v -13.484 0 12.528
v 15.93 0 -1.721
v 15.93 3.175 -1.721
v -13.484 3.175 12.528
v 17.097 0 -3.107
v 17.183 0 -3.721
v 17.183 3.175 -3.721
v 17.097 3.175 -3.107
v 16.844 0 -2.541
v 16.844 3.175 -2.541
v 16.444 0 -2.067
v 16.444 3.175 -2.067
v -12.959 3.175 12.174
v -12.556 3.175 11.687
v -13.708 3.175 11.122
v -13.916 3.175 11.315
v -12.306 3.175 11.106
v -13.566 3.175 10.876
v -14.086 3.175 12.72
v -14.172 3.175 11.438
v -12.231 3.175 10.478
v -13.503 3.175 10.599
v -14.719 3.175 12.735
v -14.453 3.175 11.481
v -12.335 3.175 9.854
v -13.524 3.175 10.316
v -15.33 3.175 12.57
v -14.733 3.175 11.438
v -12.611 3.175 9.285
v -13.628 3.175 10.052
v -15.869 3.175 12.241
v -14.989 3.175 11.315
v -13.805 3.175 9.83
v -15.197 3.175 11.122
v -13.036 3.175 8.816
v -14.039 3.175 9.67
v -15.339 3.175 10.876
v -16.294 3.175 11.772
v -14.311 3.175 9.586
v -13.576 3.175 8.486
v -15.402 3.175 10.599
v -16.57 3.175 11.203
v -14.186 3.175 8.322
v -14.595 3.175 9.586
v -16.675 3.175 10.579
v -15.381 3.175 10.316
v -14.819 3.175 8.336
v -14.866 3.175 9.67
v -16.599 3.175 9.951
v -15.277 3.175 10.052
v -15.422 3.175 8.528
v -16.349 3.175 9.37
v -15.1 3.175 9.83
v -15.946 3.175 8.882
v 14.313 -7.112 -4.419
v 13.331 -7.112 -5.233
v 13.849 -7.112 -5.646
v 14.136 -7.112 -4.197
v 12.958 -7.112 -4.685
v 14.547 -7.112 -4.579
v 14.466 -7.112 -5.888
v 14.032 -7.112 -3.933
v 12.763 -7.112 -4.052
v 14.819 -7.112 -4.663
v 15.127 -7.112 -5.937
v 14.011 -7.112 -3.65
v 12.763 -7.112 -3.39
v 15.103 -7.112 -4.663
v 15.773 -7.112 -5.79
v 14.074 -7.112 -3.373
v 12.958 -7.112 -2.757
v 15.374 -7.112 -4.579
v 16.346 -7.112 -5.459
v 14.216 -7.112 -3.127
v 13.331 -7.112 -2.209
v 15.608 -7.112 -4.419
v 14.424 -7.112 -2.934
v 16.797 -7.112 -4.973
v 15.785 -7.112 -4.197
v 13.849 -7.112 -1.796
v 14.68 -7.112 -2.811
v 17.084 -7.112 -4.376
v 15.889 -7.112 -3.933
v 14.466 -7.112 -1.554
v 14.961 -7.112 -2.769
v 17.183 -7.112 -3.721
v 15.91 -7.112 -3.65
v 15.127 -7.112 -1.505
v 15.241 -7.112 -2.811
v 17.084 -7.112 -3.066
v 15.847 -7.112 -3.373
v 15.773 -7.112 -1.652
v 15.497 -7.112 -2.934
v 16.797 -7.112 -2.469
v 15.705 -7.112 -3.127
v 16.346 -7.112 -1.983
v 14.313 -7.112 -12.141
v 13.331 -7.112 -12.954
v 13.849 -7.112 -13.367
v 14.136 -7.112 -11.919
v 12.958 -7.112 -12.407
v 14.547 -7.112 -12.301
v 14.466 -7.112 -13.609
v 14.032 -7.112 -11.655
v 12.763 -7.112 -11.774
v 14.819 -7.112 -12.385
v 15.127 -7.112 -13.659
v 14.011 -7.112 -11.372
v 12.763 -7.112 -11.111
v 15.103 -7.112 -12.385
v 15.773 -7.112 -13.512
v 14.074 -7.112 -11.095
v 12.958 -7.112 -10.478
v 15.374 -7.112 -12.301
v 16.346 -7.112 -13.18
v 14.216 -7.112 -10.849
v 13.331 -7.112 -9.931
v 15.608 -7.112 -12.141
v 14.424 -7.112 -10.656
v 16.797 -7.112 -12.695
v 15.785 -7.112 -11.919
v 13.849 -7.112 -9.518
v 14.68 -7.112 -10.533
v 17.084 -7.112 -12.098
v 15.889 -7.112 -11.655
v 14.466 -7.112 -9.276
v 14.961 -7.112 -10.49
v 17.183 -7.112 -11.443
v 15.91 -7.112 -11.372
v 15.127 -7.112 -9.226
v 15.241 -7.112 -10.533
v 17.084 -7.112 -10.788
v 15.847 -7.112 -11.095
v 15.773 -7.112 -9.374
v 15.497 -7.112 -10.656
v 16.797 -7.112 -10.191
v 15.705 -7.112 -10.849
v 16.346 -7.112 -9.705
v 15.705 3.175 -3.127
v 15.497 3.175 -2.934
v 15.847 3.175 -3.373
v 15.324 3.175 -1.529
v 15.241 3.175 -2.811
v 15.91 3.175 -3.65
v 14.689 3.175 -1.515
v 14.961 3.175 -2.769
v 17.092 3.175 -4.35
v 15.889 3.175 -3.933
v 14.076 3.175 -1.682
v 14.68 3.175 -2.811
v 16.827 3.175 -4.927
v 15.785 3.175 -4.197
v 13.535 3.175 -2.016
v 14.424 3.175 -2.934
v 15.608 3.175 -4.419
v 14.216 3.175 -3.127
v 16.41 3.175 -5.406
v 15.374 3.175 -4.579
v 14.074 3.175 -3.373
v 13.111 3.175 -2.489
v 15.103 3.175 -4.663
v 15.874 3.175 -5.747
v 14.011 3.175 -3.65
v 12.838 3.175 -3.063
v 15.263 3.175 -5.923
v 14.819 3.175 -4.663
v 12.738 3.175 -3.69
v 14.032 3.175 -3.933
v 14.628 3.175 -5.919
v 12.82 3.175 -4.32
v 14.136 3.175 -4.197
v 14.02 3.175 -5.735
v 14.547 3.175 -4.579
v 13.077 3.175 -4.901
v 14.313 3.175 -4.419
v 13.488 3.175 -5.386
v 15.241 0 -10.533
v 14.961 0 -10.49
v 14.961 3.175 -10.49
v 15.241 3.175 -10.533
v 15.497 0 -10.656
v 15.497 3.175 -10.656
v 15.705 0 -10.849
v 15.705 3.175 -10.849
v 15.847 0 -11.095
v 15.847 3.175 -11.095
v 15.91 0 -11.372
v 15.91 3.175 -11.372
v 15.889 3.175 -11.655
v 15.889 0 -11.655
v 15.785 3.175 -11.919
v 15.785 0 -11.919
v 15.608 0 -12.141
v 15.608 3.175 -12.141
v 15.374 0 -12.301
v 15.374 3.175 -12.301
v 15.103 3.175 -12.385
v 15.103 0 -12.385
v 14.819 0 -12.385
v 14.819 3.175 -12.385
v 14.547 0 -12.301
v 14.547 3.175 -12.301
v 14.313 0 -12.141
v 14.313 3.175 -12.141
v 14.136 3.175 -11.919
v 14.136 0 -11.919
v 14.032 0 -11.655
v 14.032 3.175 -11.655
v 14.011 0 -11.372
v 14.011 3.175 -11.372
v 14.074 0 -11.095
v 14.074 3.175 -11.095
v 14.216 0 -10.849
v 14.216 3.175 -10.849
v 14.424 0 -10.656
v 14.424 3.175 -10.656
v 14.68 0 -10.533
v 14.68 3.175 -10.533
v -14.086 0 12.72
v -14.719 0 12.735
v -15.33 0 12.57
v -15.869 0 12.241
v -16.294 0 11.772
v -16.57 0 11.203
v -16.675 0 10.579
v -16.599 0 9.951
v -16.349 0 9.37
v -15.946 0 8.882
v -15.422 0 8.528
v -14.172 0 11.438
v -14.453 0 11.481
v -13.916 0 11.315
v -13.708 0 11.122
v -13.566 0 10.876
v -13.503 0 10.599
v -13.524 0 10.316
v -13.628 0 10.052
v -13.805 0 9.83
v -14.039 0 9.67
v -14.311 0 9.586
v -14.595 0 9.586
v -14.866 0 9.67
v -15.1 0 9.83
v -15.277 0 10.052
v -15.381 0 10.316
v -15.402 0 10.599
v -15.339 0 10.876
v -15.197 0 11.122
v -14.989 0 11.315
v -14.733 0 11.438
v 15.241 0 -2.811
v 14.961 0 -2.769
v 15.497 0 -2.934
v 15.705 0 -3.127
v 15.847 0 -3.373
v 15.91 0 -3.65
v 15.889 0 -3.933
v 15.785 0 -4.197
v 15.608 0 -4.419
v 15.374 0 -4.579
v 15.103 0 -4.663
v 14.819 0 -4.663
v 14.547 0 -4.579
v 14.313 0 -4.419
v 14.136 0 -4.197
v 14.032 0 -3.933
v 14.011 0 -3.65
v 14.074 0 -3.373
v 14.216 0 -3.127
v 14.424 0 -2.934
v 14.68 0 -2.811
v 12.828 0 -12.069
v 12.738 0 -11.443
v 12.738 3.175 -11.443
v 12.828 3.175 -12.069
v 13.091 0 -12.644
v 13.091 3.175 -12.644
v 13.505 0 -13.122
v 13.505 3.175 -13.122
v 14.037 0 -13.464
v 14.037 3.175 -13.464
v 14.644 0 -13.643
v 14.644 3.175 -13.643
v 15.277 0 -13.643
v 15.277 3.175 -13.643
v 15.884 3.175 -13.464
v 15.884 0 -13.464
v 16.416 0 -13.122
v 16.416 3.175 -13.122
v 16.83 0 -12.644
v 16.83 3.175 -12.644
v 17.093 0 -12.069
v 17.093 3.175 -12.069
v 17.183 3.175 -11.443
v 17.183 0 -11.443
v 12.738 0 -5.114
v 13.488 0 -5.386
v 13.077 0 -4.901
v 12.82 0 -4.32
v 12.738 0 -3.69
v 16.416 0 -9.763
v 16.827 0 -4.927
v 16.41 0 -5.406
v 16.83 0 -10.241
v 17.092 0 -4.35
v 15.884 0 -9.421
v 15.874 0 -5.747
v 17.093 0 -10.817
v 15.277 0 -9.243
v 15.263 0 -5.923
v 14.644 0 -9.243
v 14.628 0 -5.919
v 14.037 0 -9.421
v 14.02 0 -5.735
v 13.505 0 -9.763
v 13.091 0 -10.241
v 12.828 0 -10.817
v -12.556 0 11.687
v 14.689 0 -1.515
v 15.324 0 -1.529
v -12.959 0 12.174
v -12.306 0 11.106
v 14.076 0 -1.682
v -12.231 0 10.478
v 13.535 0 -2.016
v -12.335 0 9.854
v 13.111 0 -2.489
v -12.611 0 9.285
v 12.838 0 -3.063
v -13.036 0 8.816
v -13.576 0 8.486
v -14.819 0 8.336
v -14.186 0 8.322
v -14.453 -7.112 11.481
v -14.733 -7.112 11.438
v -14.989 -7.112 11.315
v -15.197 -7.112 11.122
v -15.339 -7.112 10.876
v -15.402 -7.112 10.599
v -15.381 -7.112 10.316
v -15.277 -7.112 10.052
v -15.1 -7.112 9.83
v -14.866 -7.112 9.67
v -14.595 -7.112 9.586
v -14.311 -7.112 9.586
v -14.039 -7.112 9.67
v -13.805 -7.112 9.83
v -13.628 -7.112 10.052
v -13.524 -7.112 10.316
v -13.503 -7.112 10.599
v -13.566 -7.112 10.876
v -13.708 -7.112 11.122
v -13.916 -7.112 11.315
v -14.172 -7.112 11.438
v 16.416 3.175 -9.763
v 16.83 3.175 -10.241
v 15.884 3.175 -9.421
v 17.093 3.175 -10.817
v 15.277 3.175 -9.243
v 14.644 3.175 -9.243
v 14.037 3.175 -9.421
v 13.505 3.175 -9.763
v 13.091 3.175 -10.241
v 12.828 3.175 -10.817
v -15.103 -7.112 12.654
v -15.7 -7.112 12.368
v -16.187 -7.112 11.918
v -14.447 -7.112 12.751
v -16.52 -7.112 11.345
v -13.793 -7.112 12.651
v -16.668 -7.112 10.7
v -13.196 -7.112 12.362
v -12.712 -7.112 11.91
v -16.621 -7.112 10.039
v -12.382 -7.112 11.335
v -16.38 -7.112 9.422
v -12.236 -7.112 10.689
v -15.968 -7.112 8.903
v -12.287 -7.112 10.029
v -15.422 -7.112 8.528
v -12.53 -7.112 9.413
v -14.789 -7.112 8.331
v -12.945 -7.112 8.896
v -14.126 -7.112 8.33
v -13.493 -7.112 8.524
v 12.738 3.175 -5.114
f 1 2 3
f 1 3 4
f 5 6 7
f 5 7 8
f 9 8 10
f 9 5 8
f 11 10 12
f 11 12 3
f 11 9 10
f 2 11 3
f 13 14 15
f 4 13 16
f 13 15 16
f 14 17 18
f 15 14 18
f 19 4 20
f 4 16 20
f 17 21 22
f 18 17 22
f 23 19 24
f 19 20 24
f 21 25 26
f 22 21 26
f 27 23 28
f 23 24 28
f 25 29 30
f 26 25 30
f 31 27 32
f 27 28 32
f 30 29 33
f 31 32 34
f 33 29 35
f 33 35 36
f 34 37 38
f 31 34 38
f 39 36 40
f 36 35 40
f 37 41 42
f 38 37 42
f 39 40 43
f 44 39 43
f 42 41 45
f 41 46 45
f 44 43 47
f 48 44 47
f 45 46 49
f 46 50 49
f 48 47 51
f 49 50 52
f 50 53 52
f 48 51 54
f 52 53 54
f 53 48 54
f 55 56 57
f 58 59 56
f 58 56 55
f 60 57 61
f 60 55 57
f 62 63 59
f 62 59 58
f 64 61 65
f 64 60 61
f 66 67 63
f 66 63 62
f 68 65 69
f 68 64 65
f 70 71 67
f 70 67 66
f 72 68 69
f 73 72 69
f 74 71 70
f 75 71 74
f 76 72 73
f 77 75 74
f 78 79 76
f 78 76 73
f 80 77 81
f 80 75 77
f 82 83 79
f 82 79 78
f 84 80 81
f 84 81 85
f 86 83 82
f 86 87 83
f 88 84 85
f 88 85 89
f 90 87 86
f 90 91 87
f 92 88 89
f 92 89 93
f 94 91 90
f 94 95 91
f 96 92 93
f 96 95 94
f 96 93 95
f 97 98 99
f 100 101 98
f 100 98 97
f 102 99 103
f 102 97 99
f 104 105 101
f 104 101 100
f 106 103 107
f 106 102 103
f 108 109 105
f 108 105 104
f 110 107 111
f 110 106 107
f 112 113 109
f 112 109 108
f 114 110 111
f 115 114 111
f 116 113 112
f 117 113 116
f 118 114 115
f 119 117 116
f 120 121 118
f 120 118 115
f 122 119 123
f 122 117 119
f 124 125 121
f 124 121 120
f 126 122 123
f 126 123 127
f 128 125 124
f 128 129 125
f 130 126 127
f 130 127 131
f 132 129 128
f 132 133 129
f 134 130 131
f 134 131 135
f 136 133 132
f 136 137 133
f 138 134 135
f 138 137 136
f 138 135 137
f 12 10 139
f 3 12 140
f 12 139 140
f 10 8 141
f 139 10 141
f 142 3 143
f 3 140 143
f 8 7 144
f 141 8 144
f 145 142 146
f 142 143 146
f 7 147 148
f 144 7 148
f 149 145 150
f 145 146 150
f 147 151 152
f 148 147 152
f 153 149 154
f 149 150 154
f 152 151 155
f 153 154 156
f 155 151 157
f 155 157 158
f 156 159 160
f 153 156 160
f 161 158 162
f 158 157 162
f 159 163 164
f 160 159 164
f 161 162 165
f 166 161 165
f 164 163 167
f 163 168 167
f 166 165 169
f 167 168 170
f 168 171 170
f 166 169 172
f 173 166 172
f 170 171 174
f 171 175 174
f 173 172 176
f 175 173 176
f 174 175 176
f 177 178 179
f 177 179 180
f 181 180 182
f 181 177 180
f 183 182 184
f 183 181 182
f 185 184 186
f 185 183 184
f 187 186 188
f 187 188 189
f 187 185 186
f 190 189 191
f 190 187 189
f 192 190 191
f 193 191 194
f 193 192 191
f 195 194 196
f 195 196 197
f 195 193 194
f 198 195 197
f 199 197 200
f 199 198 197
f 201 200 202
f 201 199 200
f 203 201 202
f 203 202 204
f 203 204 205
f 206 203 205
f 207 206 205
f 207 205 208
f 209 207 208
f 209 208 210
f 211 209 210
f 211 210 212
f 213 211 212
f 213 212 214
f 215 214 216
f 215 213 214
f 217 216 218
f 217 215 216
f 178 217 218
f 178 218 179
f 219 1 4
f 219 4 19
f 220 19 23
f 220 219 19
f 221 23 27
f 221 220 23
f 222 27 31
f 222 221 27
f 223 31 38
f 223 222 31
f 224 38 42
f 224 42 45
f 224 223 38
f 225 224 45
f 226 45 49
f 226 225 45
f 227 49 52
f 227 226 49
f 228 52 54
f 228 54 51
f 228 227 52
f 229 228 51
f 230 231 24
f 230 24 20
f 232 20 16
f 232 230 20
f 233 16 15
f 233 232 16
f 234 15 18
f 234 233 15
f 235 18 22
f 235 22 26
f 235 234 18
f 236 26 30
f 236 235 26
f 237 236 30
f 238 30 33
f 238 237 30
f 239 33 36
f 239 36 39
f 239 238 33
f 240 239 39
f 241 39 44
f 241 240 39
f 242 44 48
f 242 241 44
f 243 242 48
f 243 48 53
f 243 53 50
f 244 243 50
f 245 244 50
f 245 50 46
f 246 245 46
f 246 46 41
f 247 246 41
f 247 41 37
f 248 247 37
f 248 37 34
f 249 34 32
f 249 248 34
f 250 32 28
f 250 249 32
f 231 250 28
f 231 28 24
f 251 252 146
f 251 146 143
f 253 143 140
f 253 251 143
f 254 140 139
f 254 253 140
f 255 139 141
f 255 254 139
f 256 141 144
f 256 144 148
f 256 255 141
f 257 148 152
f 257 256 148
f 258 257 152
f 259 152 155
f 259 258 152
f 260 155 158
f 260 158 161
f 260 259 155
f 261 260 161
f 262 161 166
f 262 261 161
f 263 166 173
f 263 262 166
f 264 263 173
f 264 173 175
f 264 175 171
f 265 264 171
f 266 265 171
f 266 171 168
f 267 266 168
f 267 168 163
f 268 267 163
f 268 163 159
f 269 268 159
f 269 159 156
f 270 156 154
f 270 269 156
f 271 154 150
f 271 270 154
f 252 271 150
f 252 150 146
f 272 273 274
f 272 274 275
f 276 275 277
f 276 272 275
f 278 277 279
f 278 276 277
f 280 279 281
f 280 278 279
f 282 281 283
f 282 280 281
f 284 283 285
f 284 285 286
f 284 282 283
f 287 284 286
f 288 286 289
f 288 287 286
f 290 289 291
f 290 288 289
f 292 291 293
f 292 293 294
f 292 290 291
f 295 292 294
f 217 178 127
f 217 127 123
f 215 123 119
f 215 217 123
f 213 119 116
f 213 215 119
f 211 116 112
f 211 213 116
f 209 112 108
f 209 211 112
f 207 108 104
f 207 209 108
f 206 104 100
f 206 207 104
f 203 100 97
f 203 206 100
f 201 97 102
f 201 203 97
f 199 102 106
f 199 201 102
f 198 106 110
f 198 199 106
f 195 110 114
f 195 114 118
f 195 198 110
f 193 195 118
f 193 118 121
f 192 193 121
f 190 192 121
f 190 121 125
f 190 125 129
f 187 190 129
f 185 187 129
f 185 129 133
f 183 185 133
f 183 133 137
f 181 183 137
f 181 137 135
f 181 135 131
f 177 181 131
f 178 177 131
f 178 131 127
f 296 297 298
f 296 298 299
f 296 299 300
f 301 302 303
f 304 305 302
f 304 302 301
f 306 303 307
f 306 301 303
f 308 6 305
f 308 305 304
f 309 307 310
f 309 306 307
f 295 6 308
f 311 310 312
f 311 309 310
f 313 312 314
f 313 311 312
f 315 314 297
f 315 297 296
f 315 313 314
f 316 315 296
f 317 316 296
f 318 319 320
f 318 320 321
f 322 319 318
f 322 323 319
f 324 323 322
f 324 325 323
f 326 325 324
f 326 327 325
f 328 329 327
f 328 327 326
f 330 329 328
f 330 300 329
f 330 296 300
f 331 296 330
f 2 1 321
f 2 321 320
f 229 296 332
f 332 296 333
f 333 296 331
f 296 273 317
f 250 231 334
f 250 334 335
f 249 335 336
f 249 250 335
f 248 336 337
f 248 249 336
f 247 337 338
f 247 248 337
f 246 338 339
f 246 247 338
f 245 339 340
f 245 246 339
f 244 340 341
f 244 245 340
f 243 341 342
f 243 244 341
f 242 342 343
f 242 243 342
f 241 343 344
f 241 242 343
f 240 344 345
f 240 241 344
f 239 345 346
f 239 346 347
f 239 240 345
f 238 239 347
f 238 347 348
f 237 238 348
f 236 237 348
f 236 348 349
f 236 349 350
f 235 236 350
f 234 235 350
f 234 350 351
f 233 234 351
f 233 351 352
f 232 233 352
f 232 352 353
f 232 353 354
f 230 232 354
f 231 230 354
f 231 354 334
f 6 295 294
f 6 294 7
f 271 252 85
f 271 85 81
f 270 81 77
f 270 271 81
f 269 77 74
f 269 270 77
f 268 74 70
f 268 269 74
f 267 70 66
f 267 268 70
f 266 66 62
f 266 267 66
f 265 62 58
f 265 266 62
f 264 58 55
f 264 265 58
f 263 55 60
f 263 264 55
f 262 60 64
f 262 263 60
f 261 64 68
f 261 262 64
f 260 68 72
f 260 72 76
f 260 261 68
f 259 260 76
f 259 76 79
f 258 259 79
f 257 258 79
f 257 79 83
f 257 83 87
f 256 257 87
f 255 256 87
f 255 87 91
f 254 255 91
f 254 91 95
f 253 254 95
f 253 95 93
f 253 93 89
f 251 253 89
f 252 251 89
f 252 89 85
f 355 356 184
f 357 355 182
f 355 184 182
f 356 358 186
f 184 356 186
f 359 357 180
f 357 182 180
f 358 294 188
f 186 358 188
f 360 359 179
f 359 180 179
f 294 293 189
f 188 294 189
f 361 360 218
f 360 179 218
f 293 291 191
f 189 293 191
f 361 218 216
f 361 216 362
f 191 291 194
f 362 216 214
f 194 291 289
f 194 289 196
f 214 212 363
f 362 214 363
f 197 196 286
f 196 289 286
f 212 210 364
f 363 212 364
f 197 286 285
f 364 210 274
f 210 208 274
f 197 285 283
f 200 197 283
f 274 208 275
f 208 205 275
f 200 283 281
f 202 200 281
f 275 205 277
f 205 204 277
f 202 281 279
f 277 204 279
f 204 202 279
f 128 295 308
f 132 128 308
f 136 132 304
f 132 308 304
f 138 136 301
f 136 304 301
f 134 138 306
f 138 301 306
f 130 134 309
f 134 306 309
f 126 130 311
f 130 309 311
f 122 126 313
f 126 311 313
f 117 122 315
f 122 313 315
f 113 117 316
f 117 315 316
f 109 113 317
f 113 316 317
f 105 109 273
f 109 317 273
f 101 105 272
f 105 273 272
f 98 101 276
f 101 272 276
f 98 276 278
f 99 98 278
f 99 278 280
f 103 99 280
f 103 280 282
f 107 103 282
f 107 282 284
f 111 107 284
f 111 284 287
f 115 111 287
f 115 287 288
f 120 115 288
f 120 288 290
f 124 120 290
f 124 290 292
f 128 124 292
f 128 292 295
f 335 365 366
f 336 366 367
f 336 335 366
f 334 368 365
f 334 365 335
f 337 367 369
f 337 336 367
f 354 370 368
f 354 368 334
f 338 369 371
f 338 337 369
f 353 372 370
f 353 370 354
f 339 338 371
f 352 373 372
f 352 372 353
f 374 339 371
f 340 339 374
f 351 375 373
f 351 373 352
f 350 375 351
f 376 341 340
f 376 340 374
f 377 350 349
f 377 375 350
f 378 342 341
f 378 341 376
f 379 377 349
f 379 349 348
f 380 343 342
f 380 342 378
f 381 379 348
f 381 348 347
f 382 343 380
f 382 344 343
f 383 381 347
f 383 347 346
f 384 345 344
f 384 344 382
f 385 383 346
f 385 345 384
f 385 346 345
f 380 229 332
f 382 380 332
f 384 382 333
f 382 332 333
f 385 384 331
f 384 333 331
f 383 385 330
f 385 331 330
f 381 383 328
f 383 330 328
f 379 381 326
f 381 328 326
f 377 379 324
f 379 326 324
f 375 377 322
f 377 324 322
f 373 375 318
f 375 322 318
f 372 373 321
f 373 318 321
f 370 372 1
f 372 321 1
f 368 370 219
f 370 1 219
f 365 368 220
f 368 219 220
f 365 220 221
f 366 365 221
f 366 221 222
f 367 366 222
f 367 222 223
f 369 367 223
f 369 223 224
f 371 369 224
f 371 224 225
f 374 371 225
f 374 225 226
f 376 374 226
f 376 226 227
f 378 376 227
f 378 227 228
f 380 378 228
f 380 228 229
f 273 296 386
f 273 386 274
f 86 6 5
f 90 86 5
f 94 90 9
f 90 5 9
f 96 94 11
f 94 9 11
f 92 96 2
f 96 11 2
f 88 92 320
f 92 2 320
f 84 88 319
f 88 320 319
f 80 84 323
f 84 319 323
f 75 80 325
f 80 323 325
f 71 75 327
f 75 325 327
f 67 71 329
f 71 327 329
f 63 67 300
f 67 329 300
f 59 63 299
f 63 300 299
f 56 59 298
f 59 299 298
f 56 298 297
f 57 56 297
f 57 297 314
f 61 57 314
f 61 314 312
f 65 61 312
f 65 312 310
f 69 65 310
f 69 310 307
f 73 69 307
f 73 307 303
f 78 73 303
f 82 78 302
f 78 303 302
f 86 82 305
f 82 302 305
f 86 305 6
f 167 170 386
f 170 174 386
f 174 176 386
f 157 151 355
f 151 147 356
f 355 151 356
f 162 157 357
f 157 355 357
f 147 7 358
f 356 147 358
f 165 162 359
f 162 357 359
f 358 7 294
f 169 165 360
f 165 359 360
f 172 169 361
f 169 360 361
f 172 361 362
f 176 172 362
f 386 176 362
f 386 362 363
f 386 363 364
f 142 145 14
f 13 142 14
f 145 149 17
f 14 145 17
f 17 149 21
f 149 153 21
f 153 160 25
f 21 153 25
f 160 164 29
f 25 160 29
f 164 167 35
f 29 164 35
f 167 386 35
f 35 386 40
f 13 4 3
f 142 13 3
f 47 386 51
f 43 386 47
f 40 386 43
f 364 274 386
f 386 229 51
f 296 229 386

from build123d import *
from build123d.topology import SkipClean

# Parameters (mm, degrees)
SKETCH1_R           = 0.9525
BOSS_EXTRUDE1_DEPTH = 3.175
BOSS_EXTRUDE2_START = -3.175
SKETCH2_R           = 2.2225
SKETCH2_R_2         = 0.9525
BOSS_EXTRUDE2_DEPTH = 10.287


with BuildPart() as part:
    # Sketch1 → Boss-Extrude1 (new body)
    with BuildSketch(Plane(origin=(0, 0, 0), x_dir=(1, 0, 0), z_dir=(0, 1, 0))):
        with BuildLine():
            Line((17.1831, 11.4427), (17.1831, 3.7211))
            ThreePointArc((17.1831, 3.7211), (16.843824504, 2.540857771), (15.929582143, 1.720955041))
            Line((15.929582143, 1.720955041), (-13.483617857, -12.528444959))
            ThreePointArc((-13.483617857, -12.528444959), (-16.452744959, -11.497282143), (-15.421582143, -8.528155041))
            Line((-15.421582143, -8.528155041), (12.7381, 5.113970764))
            Line((12.7381, 5.113970764), (12.7381, 11.4427))
            ThreePointArc((12.7381, 11.4427), (14.9606, 13.6652), (17.1831, 11.4427))
        make_face()
        with Locations(Location((-14.4526, -10.5283, 0), (0, 0, 270))):
            Circle(SKETCH1_R, mode=Mode.SUBTRACT)
        with Locations(Location((14.9606, 11.4427, 0), (0, 0, 270))):
            Circle(SKETCH1_R, mode=Mode.SUBTRACT)
        with Locations(Location((14.9606, 3.7211, 0), (0, 0, 270))):
            Circle(SKETCH1_R, mode=Mode.SUBTRACT)
    extrude(amount=BOSS_EXTRUDE1_DEPTH)

    # Sketch2 → Boss-Extrude2 (add)
    with SkipClean():  # the faces are left unmerged after this step: merging them gives an invalid solid
        with BuildSketch(Plane.XZ.offset(BOSS_EXTRUDE2_START)):
            with Locations((14.9606, -11.4427)):
                Circle(SKETCH2_R)
            with Locations(Location((14.9606, -11.4427, 0), (0, 0, 90))):
                Circle(SKETCH2_R_2, mode=Mode.SUBTRACT)
            with Locations((14.9606, -3.7211)):
                Circle(SKETCH2_R)
            with Locations(Location((14.9606, -3.7211, 0), (0, 0, 90))):
                Circle(SKETCH2_R_2, mode=Mode.SUBTRACT)
            with Locations(Location((-14.4526, 10.5283, 0), (0, 0, 244.151855468))):
                Circle(SKETCH2_R)
            with Locations(Location((-14.4526, 10.5283, 0), (0, 0, 90))):
                Circle(SKETCH2_R_2, mode=Mode.SUBTRACT)
        extrude(amount=BOSS_EXTRUDE2_DEPTH)


solid = part.part
